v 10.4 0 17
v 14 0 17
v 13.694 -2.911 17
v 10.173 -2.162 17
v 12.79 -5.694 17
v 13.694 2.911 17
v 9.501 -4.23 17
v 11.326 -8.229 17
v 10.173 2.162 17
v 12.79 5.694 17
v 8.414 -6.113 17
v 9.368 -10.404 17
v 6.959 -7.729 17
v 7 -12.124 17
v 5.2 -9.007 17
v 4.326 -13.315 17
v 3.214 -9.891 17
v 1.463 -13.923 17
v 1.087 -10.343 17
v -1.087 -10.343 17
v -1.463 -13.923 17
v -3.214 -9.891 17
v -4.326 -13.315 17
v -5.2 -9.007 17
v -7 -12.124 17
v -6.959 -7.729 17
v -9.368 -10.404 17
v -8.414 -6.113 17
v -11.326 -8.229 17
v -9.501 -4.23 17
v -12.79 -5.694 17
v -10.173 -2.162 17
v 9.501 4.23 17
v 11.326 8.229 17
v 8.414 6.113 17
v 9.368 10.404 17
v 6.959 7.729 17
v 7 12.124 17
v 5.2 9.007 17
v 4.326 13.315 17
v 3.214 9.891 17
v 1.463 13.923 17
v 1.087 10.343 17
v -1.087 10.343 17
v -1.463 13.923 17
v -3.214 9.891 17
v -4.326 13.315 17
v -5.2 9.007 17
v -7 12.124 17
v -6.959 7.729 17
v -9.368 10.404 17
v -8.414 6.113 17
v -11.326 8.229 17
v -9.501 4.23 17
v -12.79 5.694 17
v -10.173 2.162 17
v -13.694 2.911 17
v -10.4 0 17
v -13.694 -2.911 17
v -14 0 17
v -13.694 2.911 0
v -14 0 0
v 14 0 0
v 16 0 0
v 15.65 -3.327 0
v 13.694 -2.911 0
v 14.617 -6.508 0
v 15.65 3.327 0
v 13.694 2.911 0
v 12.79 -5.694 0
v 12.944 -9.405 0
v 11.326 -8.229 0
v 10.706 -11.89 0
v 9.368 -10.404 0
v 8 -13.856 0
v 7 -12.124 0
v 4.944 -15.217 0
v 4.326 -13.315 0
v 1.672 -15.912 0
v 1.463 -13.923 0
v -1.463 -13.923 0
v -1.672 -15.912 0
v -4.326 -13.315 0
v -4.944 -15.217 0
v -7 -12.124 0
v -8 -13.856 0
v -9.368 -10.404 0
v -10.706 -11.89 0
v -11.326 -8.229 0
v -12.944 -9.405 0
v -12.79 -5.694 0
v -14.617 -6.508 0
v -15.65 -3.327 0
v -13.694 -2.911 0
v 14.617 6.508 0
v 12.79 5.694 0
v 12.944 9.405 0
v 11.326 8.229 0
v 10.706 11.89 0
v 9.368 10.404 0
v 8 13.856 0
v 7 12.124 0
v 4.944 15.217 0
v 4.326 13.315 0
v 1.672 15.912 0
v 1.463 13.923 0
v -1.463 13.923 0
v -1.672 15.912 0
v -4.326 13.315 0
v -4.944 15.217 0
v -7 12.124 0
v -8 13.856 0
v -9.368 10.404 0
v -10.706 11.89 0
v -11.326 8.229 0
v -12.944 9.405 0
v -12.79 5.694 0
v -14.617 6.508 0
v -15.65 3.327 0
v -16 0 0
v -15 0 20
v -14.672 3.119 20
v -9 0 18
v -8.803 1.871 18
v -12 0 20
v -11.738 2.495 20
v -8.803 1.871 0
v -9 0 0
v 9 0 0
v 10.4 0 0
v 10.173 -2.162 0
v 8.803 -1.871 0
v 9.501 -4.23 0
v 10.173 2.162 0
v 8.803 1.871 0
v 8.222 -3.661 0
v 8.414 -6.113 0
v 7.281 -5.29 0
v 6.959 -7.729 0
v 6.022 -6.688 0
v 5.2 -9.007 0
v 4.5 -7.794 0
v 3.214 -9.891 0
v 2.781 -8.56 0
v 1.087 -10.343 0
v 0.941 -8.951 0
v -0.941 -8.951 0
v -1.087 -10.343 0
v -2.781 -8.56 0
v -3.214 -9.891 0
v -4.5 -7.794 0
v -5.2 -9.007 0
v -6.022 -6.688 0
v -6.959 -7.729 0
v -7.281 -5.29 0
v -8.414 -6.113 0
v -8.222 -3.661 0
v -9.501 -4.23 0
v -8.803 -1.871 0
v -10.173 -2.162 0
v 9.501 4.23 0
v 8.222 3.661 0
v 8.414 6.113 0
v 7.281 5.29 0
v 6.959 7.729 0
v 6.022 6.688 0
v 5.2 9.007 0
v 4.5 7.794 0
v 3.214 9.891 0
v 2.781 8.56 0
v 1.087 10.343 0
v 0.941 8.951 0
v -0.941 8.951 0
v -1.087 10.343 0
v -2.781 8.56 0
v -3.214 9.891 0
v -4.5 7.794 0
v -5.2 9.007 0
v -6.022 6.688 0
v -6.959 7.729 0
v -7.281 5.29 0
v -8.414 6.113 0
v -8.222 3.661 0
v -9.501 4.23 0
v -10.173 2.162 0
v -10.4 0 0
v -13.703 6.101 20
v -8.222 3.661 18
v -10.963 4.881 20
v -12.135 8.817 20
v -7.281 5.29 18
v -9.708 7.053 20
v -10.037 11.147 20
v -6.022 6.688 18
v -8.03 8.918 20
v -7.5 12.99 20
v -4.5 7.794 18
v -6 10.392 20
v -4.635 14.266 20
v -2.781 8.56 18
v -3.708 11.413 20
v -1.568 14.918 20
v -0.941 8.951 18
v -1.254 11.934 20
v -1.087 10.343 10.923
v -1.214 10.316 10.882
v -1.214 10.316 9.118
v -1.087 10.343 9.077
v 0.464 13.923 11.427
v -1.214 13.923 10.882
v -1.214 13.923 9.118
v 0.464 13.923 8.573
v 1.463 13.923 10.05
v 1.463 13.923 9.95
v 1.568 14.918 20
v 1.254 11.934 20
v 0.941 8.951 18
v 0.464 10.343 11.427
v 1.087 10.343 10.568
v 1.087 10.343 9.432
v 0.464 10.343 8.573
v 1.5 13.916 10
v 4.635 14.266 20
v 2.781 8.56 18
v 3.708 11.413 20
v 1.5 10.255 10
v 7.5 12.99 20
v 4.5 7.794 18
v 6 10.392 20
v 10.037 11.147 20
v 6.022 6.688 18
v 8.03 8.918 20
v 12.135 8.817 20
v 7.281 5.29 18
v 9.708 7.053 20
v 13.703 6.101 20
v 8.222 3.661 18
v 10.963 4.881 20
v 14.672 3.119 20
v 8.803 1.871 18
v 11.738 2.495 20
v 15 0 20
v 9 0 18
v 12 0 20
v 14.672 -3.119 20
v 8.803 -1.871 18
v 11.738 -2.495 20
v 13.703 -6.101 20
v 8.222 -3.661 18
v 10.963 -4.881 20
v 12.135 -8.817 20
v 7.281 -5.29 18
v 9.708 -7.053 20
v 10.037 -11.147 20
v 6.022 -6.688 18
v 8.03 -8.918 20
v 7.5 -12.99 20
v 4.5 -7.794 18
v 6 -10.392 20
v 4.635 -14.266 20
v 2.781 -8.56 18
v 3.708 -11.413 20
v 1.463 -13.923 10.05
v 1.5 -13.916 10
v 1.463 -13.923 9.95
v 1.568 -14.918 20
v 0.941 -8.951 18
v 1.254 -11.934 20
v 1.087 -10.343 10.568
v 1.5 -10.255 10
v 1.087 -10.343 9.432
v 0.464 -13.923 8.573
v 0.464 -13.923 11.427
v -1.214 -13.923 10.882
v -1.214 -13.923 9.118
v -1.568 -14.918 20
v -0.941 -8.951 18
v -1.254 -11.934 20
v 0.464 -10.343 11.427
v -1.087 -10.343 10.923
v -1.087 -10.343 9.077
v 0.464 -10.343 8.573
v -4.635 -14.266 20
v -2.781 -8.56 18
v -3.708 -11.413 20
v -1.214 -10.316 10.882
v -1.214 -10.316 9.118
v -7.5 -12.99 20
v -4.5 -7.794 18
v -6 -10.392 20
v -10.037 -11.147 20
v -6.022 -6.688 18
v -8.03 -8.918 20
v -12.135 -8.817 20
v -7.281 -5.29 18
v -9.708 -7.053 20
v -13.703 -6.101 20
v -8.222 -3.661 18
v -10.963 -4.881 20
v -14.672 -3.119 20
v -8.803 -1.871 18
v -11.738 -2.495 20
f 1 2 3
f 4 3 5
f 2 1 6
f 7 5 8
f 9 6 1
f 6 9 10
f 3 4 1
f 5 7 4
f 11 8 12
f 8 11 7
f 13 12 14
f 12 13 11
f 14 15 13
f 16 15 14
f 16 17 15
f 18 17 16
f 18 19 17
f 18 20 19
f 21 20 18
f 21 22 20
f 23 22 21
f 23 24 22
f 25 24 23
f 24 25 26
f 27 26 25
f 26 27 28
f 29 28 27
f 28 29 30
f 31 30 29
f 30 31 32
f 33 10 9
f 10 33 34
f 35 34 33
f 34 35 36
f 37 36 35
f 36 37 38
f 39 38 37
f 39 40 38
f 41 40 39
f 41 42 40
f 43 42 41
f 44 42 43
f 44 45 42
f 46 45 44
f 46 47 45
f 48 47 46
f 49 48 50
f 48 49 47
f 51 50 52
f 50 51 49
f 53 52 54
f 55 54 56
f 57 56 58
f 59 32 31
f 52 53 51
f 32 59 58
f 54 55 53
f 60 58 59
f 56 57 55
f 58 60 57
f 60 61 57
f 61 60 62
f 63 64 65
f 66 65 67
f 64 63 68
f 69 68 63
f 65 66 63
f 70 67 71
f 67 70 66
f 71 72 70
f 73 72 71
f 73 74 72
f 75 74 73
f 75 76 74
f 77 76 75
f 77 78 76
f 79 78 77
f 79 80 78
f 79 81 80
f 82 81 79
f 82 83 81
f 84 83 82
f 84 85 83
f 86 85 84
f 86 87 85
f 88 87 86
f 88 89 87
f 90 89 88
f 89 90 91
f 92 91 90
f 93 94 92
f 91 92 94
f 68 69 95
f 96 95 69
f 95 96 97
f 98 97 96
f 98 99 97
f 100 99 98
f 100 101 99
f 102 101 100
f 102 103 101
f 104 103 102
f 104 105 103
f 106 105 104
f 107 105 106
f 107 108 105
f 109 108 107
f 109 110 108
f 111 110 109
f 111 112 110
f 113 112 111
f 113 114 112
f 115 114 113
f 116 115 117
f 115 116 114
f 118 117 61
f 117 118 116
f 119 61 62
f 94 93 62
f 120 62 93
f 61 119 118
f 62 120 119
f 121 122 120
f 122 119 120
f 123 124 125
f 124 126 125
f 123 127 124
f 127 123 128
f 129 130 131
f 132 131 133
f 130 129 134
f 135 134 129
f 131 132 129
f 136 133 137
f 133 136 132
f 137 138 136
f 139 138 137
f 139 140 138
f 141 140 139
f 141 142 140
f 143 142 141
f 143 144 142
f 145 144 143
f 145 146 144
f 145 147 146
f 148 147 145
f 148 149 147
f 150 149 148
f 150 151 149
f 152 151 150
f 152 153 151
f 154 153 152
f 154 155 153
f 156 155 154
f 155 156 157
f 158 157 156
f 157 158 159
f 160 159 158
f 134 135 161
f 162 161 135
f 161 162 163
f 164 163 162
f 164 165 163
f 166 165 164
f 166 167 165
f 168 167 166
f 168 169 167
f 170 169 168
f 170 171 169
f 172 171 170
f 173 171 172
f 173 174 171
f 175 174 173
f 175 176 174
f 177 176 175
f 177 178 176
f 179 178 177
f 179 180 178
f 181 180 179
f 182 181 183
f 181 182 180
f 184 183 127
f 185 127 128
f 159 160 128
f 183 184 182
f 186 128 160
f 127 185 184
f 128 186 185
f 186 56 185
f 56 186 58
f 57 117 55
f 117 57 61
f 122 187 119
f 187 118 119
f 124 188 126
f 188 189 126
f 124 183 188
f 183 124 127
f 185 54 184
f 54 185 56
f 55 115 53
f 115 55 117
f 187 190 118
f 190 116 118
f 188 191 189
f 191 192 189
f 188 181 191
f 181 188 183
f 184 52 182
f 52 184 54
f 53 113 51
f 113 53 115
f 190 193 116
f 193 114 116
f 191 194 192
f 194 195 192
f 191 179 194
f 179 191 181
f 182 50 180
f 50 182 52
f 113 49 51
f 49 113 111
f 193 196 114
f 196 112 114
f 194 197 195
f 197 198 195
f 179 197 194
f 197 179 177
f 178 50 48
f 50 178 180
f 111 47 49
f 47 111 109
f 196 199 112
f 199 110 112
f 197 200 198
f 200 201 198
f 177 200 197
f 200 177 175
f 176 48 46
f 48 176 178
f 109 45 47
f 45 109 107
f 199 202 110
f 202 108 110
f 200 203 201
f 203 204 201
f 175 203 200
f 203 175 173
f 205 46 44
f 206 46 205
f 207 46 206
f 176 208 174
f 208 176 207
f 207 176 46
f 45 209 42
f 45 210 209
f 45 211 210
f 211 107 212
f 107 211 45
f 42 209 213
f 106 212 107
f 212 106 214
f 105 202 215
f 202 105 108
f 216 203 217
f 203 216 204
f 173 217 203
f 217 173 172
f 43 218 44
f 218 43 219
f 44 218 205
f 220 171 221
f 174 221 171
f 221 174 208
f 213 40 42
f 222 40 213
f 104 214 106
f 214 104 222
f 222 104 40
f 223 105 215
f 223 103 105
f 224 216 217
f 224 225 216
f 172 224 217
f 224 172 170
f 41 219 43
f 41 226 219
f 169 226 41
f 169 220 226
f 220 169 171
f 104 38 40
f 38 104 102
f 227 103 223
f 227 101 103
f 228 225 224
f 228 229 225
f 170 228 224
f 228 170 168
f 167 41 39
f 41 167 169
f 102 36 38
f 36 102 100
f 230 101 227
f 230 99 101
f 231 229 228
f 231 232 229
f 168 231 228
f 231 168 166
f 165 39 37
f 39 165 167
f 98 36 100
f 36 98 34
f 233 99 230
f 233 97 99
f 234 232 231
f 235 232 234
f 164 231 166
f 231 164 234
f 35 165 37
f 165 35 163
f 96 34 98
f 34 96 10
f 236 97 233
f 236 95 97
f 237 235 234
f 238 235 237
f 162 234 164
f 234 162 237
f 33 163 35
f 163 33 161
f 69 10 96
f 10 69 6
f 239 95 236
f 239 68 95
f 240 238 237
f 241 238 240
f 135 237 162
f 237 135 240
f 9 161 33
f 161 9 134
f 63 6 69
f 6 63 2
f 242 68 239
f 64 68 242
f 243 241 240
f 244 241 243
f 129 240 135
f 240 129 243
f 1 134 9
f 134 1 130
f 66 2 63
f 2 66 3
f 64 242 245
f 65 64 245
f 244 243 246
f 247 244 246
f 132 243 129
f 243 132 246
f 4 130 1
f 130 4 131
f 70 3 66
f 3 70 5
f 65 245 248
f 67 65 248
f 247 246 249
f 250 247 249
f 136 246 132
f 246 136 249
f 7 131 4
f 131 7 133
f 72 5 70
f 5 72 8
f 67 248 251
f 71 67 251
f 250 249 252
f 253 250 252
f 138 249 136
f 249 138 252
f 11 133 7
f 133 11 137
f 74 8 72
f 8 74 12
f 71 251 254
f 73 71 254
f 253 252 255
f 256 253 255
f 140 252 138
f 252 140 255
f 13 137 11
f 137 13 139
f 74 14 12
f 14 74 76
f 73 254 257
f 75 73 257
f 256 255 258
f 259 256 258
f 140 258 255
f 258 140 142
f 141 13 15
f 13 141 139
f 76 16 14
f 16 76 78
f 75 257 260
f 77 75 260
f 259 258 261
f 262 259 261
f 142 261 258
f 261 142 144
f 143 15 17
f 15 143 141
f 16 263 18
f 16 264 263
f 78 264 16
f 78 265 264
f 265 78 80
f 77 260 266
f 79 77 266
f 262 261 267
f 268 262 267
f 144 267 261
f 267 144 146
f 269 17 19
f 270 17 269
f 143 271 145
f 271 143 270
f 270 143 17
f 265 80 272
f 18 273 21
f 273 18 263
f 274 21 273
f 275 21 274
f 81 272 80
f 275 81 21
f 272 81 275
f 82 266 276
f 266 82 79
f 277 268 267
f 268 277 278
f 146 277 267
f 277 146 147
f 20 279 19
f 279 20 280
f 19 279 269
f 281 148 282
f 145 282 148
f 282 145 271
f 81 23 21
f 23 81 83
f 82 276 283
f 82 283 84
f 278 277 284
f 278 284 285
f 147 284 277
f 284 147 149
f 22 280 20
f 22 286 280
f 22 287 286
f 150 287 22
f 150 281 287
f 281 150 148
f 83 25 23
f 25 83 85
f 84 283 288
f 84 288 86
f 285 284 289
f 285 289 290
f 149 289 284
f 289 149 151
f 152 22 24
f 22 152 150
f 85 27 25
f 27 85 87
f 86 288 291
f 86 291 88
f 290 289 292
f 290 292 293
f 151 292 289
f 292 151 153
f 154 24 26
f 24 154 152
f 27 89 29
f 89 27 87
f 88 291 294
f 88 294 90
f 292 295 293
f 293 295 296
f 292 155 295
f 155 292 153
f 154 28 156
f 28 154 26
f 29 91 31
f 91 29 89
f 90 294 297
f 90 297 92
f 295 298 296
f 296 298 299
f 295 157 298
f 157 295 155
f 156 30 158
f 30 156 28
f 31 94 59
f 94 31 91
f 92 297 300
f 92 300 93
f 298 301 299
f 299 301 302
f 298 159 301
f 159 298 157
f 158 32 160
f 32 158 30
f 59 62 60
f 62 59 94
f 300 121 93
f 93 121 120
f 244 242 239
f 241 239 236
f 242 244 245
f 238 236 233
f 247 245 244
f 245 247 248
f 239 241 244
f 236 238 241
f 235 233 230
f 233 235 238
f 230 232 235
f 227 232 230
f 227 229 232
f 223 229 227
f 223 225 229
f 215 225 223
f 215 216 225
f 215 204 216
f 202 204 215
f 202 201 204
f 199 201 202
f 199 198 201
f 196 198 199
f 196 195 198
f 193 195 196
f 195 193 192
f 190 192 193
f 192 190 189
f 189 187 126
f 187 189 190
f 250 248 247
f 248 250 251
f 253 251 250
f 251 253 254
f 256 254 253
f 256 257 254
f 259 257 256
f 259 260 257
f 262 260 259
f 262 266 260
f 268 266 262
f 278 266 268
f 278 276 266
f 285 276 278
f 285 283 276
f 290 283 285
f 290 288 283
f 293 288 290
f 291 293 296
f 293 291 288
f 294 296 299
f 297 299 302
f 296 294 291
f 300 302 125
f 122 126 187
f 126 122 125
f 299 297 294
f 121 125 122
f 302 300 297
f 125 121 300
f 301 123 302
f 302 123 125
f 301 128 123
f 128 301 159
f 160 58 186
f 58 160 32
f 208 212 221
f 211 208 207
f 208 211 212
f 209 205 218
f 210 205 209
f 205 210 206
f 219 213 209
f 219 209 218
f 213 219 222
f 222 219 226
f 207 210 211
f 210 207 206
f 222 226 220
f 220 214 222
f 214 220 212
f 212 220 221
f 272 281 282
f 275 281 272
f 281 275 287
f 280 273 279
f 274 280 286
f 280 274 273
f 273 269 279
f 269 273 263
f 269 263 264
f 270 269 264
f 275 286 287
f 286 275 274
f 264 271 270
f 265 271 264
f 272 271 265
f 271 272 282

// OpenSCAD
rotate_extrude()
{
    polygon([
    [16,0],
    [15,20],
    [12,20],
    [9,18],
    [9,0],
    [10.4,0],
    [10.4, 17],
    [14,17],
    [14,0],
    ]);
}

translate([0,12,10])
    rotate([90,0,0])
    cylinder(d=3, h=6, center=true);

translate([0,-12,10])
    rotate([90,0,0])
    cylinder(d=3, h=6, center=true);
